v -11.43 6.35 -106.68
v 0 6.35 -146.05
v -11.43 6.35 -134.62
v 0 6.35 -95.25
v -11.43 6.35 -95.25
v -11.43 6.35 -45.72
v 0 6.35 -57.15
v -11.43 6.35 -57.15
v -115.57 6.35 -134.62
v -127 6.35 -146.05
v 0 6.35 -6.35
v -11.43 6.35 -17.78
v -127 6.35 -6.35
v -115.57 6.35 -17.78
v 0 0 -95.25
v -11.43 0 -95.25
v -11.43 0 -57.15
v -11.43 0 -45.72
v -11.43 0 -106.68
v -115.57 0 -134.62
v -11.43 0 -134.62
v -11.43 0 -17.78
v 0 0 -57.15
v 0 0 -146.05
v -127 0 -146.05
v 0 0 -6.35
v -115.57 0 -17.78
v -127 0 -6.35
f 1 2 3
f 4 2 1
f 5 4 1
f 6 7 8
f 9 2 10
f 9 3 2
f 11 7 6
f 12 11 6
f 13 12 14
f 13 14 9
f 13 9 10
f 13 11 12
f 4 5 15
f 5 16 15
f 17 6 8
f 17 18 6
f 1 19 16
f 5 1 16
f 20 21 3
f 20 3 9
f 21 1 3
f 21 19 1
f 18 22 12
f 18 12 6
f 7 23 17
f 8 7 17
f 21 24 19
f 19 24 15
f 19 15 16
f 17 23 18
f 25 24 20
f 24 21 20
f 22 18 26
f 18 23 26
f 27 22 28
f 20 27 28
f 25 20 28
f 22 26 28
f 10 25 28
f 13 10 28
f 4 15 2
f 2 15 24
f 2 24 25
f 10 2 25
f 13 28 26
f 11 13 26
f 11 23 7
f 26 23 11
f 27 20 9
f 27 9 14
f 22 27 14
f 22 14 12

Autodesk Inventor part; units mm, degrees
ref_plane "YZ Plane" through (0, 0, 0) normal (1, 0, 0) x (0, 1, 0)
ref_plane "XZ Plane" through (0, 0, 0) normal (0, 1, 0) x (-1, 0, 0)
ref_plane "XY Plane" through (0, 0, 0) normal (0, 0, 1) x (1, 0, 0)
sketch "Sketch1" plane through (0, 0, 0) normal (0, 1, 0) x (-1, 0, 0)
  line L0 (0, -57.15) -> (11.43, -57.15)
  line L1 (11.43, -95.25) -> (0, -95.25)
  line L2 (0, -57.15) -> (0, -6.35)
  line L3 (0, -95.25) -> (0, -146.05)
  line L4 (0, -146.05) -> (127, -146.05)
  line L5 (127, -146.05) -> (127, -6.35)
  line L6 (127, -6.35) -> (0, -6.35)
  line L7 (11.43, -17.78) -> (11.43, -45.72)
  line L8 (11.43, -106.68) -> (11.43, -134.62)
  line L9 (11.43, -134.62) -> (115.57, -134.62)
  line L10 (115.57, -134.62) -> (115.57, -17.78)
  line L11 (115.57, -17.78) -> (11.43, -17.78)
  line L12 (11.43, -45.72) -> (11.43, -57.15)
  line L13 (11.43, -106.68) -> (11.43, -95.25)
  point P0 (0, 0)
  dimension "d4" = 50.8
  dimension "d5" = 50.8
  dimension "d6" = 127
  dimension "d7" = 11.43
extrude "Extrusion1" add sketch "Sketch1" along normal blind 6.35
properties part number "Front_chasis"
